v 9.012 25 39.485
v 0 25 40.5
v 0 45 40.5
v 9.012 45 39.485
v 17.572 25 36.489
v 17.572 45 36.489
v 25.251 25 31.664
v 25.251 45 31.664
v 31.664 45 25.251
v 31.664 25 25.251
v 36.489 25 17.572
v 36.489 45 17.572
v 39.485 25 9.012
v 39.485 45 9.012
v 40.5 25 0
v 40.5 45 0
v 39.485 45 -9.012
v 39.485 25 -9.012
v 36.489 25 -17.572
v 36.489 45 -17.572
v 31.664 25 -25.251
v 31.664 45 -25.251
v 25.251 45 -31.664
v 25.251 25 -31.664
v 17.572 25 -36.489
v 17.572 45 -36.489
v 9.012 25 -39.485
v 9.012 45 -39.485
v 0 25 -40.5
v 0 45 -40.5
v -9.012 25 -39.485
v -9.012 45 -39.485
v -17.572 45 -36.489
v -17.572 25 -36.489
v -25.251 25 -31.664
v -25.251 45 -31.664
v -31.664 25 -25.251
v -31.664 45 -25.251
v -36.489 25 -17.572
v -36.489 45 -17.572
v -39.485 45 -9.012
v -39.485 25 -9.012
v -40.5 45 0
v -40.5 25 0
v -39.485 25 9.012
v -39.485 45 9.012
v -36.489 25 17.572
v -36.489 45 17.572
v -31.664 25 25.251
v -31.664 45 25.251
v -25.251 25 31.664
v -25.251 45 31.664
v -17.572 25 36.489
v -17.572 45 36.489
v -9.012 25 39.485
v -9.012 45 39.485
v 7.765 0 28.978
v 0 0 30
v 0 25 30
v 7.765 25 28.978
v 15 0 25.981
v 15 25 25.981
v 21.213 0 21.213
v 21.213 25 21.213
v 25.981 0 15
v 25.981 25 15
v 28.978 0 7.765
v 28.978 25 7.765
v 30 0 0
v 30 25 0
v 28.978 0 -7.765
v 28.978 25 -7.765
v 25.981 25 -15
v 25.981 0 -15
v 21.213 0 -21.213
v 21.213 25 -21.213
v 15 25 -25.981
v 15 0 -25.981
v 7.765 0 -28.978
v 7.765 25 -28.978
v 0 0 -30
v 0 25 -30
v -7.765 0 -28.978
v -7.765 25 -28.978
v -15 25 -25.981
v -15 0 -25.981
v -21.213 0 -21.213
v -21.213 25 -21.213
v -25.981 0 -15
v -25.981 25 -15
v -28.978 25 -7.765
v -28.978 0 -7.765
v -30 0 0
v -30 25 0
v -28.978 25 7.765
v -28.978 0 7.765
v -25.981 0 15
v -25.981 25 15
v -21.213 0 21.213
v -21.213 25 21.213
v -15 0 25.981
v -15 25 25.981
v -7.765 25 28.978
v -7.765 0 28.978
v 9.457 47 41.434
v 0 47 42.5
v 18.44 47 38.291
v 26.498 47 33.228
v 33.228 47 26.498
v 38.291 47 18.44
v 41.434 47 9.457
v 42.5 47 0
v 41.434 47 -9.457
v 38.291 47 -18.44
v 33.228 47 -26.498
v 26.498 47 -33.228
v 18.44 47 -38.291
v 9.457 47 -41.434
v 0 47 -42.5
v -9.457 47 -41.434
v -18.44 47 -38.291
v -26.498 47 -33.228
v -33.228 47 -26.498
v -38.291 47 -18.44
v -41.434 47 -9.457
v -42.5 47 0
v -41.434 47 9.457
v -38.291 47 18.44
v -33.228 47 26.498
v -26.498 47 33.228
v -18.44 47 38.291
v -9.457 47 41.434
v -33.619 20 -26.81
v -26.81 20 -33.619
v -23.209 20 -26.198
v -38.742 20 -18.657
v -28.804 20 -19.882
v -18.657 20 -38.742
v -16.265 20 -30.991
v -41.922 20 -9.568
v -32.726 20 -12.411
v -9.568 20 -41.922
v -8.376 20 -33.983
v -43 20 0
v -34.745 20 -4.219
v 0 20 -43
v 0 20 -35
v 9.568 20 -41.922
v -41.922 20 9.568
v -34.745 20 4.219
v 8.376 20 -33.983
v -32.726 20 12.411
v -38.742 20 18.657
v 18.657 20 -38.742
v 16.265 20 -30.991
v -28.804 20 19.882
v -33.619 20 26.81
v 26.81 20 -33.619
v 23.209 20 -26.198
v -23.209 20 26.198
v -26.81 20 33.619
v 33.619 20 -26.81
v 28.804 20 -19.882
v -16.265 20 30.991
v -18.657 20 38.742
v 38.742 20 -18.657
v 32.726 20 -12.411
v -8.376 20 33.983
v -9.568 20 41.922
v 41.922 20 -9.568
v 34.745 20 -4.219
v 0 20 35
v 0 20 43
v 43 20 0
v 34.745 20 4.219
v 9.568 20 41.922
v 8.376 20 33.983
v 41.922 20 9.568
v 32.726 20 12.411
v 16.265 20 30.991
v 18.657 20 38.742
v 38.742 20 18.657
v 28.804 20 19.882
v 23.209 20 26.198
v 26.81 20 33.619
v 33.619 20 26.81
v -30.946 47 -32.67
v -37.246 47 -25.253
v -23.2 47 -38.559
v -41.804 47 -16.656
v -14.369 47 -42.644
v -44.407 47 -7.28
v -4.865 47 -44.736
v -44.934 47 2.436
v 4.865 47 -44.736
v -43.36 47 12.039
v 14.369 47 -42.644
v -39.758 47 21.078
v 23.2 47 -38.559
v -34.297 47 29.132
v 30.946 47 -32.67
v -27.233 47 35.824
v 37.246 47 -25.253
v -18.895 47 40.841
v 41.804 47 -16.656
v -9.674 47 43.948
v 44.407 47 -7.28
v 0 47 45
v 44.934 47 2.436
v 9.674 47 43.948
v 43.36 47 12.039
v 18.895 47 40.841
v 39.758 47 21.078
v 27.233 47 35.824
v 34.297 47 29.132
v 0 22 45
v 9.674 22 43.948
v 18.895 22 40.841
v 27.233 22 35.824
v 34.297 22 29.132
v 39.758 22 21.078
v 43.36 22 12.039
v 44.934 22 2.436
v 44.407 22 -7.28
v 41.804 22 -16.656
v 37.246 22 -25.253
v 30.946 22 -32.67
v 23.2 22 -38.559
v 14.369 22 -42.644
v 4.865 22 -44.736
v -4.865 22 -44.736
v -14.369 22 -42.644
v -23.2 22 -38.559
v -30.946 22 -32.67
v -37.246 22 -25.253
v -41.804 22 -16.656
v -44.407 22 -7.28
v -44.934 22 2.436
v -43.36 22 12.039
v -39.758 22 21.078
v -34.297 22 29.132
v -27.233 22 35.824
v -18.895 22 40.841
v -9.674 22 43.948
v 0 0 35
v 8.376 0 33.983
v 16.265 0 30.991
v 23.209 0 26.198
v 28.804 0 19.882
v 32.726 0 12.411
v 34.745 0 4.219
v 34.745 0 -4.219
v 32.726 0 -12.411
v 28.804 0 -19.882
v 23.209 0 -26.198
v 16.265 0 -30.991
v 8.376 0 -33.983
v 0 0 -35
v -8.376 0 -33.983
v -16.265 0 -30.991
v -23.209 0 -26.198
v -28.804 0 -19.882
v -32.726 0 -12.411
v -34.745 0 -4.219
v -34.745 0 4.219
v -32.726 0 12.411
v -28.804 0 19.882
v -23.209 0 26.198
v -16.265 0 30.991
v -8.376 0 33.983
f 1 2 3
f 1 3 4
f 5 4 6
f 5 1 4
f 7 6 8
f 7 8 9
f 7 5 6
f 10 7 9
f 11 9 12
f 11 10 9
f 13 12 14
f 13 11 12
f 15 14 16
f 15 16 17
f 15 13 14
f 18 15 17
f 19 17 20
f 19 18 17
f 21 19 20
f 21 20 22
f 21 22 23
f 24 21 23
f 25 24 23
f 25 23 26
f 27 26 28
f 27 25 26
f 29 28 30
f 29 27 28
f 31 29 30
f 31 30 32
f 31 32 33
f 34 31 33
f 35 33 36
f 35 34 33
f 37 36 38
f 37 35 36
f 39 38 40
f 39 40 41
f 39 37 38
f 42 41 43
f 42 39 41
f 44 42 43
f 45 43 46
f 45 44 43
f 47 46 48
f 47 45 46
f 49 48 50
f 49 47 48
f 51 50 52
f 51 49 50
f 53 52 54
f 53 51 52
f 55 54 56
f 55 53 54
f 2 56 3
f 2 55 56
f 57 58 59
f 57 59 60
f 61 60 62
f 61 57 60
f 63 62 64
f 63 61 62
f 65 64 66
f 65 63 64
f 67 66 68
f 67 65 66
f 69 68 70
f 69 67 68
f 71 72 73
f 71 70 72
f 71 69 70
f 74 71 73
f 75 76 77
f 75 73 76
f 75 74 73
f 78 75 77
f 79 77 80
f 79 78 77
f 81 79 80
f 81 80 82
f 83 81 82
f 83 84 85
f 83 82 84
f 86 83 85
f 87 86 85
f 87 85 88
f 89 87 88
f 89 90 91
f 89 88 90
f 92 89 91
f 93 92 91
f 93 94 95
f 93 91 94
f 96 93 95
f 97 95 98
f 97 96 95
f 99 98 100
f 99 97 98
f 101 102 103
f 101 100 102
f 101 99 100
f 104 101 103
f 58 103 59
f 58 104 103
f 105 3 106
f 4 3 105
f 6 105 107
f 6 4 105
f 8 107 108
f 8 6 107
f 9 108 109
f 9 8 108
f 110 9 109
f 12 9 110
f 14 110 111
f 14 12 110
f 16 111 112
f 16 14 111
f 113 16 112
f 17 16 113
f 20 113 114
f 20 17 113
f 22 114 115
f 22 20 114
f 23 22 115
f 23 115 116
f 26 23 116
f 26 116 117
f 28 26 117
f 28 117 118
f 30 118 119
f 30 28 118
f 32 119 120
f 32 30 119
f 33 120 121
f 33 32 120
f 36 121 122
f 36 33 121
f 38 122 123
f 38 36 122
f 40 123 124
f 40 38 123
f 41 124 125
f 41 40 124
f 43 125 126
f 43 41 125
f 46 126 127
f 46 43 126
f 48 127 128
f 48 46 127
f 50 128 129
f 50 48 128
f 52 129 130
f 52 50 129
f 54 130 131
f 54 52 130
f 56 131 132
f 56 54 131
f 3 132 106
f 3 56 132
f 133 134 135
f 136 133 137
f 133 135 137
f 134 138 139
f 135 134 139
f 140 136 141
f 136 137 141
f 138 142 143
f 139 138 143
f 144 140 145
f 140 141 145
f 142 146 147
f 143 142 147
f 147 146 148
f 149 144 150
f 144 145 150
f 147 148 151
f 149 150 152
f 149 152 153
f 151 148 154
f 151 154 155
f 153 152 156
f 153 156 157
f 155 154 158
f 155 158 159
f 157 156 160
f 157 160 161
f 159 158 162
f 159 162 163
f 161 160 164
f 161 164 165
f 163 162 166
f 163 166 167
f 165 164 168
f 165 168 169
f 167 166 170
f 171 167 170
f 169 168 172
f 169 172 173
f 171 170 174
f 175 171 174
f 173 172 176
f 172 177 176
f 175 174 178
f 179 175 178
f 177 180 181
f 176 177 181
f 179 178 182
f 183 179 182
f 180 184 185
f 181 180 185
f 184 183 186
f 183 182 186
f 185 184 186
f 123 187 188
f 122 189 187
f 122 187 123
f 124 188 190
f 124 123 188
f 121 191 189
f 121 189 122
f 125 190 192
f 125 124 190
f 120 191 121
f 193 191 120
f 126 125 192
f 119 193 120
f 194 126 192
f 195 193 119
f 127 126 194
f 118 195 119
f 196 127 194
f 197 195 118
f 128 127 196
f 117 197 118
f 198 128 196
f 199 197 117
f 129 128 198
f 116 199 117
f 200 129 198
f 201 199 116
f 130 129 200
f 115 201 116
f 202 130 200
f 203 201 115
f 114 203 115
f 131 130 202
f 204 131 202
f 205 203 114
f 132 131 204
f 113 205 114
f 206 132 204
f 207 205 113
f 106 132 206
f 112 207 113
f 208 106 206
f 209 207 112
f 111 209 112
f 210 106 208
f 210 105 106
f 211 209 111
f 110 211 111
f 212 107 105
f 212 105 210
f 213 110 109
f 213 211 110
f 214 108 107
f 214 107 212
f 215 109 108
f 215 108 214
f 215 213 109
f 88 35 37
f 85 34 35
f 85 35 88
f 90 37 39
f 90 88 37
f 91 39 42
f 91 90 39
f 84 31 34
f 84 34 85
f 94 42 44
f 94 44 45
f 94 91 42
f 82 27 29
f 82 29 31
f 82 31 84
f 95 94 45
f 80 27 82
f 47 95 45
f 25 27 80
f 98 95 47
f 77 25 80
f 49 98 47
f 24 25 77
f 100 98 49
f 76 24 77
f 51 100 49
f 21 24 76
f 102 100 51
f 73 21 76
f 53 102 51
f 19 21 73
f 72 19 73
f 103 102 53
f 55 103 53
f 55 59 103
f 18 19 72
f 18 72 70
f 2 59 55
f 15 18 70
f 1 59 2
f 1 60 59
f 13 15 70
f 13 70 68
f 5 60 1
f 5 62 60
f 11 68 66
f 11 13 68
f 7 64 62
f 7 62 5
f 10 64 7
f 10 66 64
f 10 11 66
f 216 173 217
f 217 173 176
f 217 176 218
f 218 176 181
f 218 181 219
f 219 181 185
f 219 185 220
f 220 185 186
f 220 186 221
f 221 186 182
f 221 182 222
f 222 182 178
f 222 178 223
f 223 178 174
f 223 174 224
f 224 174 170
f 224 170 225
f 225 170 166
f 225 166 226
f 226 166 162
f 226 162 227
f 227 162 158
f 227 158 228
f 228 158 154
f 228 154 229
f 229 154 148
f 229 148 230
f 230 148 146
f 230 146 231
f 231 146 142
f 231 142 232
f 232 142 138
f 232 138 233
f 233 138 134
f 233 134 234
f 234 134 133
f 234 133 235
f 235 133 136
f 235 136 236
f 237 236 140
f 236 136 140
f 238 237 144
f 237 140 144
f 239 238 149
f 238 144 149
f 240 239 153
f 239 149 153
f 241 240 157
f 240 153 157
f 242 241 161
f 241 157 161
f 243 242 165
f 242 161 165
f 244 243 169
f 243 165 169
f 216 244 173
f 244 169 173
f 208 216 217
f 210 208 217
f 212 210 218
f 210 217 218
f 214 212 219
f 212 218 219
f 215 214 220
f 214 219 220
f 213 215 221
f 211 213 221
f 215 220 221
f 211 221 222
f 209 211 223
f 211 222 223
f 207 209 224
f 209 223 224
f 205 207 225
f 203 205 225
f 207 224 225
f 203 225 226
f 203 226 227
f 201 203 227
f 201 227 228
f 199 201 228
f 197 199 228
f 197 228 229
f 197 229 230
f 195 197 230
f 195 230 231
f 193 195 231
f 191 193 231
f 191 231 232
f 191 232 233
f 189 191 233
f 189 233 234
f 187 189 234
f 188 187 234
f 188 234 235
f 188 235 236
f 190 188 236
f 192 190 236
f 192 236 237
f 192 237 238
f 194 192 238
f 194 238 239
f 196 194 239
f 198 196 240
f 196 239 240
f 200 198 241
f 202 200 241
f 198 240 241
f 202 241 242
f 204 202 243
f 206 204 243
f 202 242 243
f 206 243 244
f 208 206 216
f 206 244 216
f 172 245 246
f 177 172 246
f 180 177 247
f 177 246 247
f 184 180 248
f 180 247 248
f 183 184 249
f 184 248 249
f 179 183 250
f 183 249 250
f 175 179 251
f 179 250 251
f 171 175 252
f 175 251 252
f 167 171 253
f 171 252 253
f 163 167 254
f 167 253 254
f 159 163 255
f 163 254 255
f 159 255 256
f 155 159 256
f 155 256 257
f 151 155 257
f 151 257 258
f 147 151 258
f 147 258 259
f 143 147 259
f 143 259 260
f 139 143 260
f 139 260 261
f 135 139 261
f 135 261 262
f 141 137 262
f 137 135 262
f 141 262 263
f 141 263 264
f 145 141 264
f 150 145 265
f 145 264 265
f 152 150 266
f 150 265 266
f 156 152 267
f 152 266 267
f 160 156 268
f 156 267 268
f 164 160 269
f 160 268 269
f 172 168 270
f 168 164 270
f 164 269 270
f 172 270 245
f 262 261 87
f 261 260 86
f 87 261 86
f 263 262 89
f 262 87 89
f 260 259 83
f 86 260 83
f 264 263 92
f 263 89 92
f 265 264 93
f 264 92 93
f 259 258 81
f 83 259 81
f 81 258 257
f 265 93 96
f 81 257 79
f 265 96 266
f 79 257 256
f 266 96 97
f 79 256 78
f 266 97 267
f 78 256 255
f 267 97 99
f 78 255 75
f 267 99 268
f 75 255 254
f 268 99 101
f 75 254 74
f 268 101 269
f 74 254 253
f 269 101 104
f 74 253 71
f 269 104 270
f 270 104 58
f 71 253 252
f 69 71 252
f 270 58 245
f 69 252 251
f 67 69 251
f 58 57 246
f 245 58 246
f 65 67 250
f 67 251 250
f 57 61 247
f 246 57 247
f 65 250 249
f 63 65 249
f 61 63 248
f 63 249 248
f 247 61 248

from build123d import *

# Parameters (mm, degrees)
SCHIZZO1_R        = 35
SCHIZZO1_R_2      = 30
ESTRUSIONE1_DEPTH = 30
ESTRUSIONE2_START = -10
SCHIZZO2_R        = 45
SCHIZZO2_R_2      = 30
ESTRUSIONE2_DEPTH = 5
SCHIZZO3_R        = 45
SCHIZZO3_R_2      = 40.5
ESTRUSIONE3_DEPTH = 22
SMUSSO1_SIZE      = 2
SMUSSO2_SIZE      = 2
SCHIZZO4_R        = 40.5
ESTRUSIONE4_DEPTH = 20


with BuildPart() as part:
    # Schizzo1 → Estrusione1 (new body)
    with BuildSketch(Plane(origin=(0, 0, 0), x_dir=(1, 0, 0), z_dir=(0, 1, 0))):
        with Locations(Location((0, 0, 0), (0, 0, 270))):
            Circle(SCHIZZO1_R)
        with Locations(Location((0, 0, 0), (0, 0, 270))):
            Circle(SCHIZZO1_R_2, mode=Mode.SUBTRACT)
    extrude(amount=ESTRUSIONE1_DEPTH)

    # Schizzo2 → Estrusione2 (add)
    with BuildSketch(Plane(origin=(0, 30, 0), x_dir=(1, 0, 0), z_dir=(0, 1, 0)).offset(ESTRUSIONE2_START)):
        with Locations(Location((0, 0, 0), (0, 0, 270))):
            Circle(SCHIZZO2_R)
        with Locations(Location((0, 0, 0), (0, 0, 270))):
            Circle(SCHIZZO2_R_2, mode=Mode.SUBTRACT)
    extrude(amount=ESTRUSIONE2_DEPTH)

    # Schizzo3 → Estrusione3 (add)
    with BuildSketch(Plane(origin=(0, 25, 0), x_dir=(1, 0, 0), z_dir=(0, 1, 0))):
        with Locations(Location((0, 0, 0), (0, 0, 270))):
            Circle(SCHIZZO3_R)
        with Locations(Location((0, 0, 0), (0, 0, 270))):
            Circle(SCHIZZO3_R_2, mode=Mode.SUBTRACT)
    extrude(amount=ESTRUSIONE3_DEPTH)

    # Smusso1
    smusso1_edges = [part.edges().sort_by_distance(p)[0] for p in [
        (0, 20, -45),
    ]]
    chamfer(smusso1_edges, length=SMUSSO1_SIZE)

    # Smusso2
    smusso2_edges = [part.edges().sort_by_distance(p)[0] for p in [
        (0, 47, -40.5),
    ]]
    chamfer(smusso2_edges, length=SMUSSO2_SIZE)

    # Schizzo4 → Estrusione4 (cut)
    with BuildSketch(Plane(origin=(0, 25, 0), x_dir=(1, 0, 0), z_dir=(0, 1, 0))):
        with Locations(Location((0, 0, 0), (0, 0, 270))):
            Circle(SCHIZZO4_R)
    extrude(amount=ESTRUSIONE4_DEPTH, mode=Mode.SUBTRACT)


solid = part.part
